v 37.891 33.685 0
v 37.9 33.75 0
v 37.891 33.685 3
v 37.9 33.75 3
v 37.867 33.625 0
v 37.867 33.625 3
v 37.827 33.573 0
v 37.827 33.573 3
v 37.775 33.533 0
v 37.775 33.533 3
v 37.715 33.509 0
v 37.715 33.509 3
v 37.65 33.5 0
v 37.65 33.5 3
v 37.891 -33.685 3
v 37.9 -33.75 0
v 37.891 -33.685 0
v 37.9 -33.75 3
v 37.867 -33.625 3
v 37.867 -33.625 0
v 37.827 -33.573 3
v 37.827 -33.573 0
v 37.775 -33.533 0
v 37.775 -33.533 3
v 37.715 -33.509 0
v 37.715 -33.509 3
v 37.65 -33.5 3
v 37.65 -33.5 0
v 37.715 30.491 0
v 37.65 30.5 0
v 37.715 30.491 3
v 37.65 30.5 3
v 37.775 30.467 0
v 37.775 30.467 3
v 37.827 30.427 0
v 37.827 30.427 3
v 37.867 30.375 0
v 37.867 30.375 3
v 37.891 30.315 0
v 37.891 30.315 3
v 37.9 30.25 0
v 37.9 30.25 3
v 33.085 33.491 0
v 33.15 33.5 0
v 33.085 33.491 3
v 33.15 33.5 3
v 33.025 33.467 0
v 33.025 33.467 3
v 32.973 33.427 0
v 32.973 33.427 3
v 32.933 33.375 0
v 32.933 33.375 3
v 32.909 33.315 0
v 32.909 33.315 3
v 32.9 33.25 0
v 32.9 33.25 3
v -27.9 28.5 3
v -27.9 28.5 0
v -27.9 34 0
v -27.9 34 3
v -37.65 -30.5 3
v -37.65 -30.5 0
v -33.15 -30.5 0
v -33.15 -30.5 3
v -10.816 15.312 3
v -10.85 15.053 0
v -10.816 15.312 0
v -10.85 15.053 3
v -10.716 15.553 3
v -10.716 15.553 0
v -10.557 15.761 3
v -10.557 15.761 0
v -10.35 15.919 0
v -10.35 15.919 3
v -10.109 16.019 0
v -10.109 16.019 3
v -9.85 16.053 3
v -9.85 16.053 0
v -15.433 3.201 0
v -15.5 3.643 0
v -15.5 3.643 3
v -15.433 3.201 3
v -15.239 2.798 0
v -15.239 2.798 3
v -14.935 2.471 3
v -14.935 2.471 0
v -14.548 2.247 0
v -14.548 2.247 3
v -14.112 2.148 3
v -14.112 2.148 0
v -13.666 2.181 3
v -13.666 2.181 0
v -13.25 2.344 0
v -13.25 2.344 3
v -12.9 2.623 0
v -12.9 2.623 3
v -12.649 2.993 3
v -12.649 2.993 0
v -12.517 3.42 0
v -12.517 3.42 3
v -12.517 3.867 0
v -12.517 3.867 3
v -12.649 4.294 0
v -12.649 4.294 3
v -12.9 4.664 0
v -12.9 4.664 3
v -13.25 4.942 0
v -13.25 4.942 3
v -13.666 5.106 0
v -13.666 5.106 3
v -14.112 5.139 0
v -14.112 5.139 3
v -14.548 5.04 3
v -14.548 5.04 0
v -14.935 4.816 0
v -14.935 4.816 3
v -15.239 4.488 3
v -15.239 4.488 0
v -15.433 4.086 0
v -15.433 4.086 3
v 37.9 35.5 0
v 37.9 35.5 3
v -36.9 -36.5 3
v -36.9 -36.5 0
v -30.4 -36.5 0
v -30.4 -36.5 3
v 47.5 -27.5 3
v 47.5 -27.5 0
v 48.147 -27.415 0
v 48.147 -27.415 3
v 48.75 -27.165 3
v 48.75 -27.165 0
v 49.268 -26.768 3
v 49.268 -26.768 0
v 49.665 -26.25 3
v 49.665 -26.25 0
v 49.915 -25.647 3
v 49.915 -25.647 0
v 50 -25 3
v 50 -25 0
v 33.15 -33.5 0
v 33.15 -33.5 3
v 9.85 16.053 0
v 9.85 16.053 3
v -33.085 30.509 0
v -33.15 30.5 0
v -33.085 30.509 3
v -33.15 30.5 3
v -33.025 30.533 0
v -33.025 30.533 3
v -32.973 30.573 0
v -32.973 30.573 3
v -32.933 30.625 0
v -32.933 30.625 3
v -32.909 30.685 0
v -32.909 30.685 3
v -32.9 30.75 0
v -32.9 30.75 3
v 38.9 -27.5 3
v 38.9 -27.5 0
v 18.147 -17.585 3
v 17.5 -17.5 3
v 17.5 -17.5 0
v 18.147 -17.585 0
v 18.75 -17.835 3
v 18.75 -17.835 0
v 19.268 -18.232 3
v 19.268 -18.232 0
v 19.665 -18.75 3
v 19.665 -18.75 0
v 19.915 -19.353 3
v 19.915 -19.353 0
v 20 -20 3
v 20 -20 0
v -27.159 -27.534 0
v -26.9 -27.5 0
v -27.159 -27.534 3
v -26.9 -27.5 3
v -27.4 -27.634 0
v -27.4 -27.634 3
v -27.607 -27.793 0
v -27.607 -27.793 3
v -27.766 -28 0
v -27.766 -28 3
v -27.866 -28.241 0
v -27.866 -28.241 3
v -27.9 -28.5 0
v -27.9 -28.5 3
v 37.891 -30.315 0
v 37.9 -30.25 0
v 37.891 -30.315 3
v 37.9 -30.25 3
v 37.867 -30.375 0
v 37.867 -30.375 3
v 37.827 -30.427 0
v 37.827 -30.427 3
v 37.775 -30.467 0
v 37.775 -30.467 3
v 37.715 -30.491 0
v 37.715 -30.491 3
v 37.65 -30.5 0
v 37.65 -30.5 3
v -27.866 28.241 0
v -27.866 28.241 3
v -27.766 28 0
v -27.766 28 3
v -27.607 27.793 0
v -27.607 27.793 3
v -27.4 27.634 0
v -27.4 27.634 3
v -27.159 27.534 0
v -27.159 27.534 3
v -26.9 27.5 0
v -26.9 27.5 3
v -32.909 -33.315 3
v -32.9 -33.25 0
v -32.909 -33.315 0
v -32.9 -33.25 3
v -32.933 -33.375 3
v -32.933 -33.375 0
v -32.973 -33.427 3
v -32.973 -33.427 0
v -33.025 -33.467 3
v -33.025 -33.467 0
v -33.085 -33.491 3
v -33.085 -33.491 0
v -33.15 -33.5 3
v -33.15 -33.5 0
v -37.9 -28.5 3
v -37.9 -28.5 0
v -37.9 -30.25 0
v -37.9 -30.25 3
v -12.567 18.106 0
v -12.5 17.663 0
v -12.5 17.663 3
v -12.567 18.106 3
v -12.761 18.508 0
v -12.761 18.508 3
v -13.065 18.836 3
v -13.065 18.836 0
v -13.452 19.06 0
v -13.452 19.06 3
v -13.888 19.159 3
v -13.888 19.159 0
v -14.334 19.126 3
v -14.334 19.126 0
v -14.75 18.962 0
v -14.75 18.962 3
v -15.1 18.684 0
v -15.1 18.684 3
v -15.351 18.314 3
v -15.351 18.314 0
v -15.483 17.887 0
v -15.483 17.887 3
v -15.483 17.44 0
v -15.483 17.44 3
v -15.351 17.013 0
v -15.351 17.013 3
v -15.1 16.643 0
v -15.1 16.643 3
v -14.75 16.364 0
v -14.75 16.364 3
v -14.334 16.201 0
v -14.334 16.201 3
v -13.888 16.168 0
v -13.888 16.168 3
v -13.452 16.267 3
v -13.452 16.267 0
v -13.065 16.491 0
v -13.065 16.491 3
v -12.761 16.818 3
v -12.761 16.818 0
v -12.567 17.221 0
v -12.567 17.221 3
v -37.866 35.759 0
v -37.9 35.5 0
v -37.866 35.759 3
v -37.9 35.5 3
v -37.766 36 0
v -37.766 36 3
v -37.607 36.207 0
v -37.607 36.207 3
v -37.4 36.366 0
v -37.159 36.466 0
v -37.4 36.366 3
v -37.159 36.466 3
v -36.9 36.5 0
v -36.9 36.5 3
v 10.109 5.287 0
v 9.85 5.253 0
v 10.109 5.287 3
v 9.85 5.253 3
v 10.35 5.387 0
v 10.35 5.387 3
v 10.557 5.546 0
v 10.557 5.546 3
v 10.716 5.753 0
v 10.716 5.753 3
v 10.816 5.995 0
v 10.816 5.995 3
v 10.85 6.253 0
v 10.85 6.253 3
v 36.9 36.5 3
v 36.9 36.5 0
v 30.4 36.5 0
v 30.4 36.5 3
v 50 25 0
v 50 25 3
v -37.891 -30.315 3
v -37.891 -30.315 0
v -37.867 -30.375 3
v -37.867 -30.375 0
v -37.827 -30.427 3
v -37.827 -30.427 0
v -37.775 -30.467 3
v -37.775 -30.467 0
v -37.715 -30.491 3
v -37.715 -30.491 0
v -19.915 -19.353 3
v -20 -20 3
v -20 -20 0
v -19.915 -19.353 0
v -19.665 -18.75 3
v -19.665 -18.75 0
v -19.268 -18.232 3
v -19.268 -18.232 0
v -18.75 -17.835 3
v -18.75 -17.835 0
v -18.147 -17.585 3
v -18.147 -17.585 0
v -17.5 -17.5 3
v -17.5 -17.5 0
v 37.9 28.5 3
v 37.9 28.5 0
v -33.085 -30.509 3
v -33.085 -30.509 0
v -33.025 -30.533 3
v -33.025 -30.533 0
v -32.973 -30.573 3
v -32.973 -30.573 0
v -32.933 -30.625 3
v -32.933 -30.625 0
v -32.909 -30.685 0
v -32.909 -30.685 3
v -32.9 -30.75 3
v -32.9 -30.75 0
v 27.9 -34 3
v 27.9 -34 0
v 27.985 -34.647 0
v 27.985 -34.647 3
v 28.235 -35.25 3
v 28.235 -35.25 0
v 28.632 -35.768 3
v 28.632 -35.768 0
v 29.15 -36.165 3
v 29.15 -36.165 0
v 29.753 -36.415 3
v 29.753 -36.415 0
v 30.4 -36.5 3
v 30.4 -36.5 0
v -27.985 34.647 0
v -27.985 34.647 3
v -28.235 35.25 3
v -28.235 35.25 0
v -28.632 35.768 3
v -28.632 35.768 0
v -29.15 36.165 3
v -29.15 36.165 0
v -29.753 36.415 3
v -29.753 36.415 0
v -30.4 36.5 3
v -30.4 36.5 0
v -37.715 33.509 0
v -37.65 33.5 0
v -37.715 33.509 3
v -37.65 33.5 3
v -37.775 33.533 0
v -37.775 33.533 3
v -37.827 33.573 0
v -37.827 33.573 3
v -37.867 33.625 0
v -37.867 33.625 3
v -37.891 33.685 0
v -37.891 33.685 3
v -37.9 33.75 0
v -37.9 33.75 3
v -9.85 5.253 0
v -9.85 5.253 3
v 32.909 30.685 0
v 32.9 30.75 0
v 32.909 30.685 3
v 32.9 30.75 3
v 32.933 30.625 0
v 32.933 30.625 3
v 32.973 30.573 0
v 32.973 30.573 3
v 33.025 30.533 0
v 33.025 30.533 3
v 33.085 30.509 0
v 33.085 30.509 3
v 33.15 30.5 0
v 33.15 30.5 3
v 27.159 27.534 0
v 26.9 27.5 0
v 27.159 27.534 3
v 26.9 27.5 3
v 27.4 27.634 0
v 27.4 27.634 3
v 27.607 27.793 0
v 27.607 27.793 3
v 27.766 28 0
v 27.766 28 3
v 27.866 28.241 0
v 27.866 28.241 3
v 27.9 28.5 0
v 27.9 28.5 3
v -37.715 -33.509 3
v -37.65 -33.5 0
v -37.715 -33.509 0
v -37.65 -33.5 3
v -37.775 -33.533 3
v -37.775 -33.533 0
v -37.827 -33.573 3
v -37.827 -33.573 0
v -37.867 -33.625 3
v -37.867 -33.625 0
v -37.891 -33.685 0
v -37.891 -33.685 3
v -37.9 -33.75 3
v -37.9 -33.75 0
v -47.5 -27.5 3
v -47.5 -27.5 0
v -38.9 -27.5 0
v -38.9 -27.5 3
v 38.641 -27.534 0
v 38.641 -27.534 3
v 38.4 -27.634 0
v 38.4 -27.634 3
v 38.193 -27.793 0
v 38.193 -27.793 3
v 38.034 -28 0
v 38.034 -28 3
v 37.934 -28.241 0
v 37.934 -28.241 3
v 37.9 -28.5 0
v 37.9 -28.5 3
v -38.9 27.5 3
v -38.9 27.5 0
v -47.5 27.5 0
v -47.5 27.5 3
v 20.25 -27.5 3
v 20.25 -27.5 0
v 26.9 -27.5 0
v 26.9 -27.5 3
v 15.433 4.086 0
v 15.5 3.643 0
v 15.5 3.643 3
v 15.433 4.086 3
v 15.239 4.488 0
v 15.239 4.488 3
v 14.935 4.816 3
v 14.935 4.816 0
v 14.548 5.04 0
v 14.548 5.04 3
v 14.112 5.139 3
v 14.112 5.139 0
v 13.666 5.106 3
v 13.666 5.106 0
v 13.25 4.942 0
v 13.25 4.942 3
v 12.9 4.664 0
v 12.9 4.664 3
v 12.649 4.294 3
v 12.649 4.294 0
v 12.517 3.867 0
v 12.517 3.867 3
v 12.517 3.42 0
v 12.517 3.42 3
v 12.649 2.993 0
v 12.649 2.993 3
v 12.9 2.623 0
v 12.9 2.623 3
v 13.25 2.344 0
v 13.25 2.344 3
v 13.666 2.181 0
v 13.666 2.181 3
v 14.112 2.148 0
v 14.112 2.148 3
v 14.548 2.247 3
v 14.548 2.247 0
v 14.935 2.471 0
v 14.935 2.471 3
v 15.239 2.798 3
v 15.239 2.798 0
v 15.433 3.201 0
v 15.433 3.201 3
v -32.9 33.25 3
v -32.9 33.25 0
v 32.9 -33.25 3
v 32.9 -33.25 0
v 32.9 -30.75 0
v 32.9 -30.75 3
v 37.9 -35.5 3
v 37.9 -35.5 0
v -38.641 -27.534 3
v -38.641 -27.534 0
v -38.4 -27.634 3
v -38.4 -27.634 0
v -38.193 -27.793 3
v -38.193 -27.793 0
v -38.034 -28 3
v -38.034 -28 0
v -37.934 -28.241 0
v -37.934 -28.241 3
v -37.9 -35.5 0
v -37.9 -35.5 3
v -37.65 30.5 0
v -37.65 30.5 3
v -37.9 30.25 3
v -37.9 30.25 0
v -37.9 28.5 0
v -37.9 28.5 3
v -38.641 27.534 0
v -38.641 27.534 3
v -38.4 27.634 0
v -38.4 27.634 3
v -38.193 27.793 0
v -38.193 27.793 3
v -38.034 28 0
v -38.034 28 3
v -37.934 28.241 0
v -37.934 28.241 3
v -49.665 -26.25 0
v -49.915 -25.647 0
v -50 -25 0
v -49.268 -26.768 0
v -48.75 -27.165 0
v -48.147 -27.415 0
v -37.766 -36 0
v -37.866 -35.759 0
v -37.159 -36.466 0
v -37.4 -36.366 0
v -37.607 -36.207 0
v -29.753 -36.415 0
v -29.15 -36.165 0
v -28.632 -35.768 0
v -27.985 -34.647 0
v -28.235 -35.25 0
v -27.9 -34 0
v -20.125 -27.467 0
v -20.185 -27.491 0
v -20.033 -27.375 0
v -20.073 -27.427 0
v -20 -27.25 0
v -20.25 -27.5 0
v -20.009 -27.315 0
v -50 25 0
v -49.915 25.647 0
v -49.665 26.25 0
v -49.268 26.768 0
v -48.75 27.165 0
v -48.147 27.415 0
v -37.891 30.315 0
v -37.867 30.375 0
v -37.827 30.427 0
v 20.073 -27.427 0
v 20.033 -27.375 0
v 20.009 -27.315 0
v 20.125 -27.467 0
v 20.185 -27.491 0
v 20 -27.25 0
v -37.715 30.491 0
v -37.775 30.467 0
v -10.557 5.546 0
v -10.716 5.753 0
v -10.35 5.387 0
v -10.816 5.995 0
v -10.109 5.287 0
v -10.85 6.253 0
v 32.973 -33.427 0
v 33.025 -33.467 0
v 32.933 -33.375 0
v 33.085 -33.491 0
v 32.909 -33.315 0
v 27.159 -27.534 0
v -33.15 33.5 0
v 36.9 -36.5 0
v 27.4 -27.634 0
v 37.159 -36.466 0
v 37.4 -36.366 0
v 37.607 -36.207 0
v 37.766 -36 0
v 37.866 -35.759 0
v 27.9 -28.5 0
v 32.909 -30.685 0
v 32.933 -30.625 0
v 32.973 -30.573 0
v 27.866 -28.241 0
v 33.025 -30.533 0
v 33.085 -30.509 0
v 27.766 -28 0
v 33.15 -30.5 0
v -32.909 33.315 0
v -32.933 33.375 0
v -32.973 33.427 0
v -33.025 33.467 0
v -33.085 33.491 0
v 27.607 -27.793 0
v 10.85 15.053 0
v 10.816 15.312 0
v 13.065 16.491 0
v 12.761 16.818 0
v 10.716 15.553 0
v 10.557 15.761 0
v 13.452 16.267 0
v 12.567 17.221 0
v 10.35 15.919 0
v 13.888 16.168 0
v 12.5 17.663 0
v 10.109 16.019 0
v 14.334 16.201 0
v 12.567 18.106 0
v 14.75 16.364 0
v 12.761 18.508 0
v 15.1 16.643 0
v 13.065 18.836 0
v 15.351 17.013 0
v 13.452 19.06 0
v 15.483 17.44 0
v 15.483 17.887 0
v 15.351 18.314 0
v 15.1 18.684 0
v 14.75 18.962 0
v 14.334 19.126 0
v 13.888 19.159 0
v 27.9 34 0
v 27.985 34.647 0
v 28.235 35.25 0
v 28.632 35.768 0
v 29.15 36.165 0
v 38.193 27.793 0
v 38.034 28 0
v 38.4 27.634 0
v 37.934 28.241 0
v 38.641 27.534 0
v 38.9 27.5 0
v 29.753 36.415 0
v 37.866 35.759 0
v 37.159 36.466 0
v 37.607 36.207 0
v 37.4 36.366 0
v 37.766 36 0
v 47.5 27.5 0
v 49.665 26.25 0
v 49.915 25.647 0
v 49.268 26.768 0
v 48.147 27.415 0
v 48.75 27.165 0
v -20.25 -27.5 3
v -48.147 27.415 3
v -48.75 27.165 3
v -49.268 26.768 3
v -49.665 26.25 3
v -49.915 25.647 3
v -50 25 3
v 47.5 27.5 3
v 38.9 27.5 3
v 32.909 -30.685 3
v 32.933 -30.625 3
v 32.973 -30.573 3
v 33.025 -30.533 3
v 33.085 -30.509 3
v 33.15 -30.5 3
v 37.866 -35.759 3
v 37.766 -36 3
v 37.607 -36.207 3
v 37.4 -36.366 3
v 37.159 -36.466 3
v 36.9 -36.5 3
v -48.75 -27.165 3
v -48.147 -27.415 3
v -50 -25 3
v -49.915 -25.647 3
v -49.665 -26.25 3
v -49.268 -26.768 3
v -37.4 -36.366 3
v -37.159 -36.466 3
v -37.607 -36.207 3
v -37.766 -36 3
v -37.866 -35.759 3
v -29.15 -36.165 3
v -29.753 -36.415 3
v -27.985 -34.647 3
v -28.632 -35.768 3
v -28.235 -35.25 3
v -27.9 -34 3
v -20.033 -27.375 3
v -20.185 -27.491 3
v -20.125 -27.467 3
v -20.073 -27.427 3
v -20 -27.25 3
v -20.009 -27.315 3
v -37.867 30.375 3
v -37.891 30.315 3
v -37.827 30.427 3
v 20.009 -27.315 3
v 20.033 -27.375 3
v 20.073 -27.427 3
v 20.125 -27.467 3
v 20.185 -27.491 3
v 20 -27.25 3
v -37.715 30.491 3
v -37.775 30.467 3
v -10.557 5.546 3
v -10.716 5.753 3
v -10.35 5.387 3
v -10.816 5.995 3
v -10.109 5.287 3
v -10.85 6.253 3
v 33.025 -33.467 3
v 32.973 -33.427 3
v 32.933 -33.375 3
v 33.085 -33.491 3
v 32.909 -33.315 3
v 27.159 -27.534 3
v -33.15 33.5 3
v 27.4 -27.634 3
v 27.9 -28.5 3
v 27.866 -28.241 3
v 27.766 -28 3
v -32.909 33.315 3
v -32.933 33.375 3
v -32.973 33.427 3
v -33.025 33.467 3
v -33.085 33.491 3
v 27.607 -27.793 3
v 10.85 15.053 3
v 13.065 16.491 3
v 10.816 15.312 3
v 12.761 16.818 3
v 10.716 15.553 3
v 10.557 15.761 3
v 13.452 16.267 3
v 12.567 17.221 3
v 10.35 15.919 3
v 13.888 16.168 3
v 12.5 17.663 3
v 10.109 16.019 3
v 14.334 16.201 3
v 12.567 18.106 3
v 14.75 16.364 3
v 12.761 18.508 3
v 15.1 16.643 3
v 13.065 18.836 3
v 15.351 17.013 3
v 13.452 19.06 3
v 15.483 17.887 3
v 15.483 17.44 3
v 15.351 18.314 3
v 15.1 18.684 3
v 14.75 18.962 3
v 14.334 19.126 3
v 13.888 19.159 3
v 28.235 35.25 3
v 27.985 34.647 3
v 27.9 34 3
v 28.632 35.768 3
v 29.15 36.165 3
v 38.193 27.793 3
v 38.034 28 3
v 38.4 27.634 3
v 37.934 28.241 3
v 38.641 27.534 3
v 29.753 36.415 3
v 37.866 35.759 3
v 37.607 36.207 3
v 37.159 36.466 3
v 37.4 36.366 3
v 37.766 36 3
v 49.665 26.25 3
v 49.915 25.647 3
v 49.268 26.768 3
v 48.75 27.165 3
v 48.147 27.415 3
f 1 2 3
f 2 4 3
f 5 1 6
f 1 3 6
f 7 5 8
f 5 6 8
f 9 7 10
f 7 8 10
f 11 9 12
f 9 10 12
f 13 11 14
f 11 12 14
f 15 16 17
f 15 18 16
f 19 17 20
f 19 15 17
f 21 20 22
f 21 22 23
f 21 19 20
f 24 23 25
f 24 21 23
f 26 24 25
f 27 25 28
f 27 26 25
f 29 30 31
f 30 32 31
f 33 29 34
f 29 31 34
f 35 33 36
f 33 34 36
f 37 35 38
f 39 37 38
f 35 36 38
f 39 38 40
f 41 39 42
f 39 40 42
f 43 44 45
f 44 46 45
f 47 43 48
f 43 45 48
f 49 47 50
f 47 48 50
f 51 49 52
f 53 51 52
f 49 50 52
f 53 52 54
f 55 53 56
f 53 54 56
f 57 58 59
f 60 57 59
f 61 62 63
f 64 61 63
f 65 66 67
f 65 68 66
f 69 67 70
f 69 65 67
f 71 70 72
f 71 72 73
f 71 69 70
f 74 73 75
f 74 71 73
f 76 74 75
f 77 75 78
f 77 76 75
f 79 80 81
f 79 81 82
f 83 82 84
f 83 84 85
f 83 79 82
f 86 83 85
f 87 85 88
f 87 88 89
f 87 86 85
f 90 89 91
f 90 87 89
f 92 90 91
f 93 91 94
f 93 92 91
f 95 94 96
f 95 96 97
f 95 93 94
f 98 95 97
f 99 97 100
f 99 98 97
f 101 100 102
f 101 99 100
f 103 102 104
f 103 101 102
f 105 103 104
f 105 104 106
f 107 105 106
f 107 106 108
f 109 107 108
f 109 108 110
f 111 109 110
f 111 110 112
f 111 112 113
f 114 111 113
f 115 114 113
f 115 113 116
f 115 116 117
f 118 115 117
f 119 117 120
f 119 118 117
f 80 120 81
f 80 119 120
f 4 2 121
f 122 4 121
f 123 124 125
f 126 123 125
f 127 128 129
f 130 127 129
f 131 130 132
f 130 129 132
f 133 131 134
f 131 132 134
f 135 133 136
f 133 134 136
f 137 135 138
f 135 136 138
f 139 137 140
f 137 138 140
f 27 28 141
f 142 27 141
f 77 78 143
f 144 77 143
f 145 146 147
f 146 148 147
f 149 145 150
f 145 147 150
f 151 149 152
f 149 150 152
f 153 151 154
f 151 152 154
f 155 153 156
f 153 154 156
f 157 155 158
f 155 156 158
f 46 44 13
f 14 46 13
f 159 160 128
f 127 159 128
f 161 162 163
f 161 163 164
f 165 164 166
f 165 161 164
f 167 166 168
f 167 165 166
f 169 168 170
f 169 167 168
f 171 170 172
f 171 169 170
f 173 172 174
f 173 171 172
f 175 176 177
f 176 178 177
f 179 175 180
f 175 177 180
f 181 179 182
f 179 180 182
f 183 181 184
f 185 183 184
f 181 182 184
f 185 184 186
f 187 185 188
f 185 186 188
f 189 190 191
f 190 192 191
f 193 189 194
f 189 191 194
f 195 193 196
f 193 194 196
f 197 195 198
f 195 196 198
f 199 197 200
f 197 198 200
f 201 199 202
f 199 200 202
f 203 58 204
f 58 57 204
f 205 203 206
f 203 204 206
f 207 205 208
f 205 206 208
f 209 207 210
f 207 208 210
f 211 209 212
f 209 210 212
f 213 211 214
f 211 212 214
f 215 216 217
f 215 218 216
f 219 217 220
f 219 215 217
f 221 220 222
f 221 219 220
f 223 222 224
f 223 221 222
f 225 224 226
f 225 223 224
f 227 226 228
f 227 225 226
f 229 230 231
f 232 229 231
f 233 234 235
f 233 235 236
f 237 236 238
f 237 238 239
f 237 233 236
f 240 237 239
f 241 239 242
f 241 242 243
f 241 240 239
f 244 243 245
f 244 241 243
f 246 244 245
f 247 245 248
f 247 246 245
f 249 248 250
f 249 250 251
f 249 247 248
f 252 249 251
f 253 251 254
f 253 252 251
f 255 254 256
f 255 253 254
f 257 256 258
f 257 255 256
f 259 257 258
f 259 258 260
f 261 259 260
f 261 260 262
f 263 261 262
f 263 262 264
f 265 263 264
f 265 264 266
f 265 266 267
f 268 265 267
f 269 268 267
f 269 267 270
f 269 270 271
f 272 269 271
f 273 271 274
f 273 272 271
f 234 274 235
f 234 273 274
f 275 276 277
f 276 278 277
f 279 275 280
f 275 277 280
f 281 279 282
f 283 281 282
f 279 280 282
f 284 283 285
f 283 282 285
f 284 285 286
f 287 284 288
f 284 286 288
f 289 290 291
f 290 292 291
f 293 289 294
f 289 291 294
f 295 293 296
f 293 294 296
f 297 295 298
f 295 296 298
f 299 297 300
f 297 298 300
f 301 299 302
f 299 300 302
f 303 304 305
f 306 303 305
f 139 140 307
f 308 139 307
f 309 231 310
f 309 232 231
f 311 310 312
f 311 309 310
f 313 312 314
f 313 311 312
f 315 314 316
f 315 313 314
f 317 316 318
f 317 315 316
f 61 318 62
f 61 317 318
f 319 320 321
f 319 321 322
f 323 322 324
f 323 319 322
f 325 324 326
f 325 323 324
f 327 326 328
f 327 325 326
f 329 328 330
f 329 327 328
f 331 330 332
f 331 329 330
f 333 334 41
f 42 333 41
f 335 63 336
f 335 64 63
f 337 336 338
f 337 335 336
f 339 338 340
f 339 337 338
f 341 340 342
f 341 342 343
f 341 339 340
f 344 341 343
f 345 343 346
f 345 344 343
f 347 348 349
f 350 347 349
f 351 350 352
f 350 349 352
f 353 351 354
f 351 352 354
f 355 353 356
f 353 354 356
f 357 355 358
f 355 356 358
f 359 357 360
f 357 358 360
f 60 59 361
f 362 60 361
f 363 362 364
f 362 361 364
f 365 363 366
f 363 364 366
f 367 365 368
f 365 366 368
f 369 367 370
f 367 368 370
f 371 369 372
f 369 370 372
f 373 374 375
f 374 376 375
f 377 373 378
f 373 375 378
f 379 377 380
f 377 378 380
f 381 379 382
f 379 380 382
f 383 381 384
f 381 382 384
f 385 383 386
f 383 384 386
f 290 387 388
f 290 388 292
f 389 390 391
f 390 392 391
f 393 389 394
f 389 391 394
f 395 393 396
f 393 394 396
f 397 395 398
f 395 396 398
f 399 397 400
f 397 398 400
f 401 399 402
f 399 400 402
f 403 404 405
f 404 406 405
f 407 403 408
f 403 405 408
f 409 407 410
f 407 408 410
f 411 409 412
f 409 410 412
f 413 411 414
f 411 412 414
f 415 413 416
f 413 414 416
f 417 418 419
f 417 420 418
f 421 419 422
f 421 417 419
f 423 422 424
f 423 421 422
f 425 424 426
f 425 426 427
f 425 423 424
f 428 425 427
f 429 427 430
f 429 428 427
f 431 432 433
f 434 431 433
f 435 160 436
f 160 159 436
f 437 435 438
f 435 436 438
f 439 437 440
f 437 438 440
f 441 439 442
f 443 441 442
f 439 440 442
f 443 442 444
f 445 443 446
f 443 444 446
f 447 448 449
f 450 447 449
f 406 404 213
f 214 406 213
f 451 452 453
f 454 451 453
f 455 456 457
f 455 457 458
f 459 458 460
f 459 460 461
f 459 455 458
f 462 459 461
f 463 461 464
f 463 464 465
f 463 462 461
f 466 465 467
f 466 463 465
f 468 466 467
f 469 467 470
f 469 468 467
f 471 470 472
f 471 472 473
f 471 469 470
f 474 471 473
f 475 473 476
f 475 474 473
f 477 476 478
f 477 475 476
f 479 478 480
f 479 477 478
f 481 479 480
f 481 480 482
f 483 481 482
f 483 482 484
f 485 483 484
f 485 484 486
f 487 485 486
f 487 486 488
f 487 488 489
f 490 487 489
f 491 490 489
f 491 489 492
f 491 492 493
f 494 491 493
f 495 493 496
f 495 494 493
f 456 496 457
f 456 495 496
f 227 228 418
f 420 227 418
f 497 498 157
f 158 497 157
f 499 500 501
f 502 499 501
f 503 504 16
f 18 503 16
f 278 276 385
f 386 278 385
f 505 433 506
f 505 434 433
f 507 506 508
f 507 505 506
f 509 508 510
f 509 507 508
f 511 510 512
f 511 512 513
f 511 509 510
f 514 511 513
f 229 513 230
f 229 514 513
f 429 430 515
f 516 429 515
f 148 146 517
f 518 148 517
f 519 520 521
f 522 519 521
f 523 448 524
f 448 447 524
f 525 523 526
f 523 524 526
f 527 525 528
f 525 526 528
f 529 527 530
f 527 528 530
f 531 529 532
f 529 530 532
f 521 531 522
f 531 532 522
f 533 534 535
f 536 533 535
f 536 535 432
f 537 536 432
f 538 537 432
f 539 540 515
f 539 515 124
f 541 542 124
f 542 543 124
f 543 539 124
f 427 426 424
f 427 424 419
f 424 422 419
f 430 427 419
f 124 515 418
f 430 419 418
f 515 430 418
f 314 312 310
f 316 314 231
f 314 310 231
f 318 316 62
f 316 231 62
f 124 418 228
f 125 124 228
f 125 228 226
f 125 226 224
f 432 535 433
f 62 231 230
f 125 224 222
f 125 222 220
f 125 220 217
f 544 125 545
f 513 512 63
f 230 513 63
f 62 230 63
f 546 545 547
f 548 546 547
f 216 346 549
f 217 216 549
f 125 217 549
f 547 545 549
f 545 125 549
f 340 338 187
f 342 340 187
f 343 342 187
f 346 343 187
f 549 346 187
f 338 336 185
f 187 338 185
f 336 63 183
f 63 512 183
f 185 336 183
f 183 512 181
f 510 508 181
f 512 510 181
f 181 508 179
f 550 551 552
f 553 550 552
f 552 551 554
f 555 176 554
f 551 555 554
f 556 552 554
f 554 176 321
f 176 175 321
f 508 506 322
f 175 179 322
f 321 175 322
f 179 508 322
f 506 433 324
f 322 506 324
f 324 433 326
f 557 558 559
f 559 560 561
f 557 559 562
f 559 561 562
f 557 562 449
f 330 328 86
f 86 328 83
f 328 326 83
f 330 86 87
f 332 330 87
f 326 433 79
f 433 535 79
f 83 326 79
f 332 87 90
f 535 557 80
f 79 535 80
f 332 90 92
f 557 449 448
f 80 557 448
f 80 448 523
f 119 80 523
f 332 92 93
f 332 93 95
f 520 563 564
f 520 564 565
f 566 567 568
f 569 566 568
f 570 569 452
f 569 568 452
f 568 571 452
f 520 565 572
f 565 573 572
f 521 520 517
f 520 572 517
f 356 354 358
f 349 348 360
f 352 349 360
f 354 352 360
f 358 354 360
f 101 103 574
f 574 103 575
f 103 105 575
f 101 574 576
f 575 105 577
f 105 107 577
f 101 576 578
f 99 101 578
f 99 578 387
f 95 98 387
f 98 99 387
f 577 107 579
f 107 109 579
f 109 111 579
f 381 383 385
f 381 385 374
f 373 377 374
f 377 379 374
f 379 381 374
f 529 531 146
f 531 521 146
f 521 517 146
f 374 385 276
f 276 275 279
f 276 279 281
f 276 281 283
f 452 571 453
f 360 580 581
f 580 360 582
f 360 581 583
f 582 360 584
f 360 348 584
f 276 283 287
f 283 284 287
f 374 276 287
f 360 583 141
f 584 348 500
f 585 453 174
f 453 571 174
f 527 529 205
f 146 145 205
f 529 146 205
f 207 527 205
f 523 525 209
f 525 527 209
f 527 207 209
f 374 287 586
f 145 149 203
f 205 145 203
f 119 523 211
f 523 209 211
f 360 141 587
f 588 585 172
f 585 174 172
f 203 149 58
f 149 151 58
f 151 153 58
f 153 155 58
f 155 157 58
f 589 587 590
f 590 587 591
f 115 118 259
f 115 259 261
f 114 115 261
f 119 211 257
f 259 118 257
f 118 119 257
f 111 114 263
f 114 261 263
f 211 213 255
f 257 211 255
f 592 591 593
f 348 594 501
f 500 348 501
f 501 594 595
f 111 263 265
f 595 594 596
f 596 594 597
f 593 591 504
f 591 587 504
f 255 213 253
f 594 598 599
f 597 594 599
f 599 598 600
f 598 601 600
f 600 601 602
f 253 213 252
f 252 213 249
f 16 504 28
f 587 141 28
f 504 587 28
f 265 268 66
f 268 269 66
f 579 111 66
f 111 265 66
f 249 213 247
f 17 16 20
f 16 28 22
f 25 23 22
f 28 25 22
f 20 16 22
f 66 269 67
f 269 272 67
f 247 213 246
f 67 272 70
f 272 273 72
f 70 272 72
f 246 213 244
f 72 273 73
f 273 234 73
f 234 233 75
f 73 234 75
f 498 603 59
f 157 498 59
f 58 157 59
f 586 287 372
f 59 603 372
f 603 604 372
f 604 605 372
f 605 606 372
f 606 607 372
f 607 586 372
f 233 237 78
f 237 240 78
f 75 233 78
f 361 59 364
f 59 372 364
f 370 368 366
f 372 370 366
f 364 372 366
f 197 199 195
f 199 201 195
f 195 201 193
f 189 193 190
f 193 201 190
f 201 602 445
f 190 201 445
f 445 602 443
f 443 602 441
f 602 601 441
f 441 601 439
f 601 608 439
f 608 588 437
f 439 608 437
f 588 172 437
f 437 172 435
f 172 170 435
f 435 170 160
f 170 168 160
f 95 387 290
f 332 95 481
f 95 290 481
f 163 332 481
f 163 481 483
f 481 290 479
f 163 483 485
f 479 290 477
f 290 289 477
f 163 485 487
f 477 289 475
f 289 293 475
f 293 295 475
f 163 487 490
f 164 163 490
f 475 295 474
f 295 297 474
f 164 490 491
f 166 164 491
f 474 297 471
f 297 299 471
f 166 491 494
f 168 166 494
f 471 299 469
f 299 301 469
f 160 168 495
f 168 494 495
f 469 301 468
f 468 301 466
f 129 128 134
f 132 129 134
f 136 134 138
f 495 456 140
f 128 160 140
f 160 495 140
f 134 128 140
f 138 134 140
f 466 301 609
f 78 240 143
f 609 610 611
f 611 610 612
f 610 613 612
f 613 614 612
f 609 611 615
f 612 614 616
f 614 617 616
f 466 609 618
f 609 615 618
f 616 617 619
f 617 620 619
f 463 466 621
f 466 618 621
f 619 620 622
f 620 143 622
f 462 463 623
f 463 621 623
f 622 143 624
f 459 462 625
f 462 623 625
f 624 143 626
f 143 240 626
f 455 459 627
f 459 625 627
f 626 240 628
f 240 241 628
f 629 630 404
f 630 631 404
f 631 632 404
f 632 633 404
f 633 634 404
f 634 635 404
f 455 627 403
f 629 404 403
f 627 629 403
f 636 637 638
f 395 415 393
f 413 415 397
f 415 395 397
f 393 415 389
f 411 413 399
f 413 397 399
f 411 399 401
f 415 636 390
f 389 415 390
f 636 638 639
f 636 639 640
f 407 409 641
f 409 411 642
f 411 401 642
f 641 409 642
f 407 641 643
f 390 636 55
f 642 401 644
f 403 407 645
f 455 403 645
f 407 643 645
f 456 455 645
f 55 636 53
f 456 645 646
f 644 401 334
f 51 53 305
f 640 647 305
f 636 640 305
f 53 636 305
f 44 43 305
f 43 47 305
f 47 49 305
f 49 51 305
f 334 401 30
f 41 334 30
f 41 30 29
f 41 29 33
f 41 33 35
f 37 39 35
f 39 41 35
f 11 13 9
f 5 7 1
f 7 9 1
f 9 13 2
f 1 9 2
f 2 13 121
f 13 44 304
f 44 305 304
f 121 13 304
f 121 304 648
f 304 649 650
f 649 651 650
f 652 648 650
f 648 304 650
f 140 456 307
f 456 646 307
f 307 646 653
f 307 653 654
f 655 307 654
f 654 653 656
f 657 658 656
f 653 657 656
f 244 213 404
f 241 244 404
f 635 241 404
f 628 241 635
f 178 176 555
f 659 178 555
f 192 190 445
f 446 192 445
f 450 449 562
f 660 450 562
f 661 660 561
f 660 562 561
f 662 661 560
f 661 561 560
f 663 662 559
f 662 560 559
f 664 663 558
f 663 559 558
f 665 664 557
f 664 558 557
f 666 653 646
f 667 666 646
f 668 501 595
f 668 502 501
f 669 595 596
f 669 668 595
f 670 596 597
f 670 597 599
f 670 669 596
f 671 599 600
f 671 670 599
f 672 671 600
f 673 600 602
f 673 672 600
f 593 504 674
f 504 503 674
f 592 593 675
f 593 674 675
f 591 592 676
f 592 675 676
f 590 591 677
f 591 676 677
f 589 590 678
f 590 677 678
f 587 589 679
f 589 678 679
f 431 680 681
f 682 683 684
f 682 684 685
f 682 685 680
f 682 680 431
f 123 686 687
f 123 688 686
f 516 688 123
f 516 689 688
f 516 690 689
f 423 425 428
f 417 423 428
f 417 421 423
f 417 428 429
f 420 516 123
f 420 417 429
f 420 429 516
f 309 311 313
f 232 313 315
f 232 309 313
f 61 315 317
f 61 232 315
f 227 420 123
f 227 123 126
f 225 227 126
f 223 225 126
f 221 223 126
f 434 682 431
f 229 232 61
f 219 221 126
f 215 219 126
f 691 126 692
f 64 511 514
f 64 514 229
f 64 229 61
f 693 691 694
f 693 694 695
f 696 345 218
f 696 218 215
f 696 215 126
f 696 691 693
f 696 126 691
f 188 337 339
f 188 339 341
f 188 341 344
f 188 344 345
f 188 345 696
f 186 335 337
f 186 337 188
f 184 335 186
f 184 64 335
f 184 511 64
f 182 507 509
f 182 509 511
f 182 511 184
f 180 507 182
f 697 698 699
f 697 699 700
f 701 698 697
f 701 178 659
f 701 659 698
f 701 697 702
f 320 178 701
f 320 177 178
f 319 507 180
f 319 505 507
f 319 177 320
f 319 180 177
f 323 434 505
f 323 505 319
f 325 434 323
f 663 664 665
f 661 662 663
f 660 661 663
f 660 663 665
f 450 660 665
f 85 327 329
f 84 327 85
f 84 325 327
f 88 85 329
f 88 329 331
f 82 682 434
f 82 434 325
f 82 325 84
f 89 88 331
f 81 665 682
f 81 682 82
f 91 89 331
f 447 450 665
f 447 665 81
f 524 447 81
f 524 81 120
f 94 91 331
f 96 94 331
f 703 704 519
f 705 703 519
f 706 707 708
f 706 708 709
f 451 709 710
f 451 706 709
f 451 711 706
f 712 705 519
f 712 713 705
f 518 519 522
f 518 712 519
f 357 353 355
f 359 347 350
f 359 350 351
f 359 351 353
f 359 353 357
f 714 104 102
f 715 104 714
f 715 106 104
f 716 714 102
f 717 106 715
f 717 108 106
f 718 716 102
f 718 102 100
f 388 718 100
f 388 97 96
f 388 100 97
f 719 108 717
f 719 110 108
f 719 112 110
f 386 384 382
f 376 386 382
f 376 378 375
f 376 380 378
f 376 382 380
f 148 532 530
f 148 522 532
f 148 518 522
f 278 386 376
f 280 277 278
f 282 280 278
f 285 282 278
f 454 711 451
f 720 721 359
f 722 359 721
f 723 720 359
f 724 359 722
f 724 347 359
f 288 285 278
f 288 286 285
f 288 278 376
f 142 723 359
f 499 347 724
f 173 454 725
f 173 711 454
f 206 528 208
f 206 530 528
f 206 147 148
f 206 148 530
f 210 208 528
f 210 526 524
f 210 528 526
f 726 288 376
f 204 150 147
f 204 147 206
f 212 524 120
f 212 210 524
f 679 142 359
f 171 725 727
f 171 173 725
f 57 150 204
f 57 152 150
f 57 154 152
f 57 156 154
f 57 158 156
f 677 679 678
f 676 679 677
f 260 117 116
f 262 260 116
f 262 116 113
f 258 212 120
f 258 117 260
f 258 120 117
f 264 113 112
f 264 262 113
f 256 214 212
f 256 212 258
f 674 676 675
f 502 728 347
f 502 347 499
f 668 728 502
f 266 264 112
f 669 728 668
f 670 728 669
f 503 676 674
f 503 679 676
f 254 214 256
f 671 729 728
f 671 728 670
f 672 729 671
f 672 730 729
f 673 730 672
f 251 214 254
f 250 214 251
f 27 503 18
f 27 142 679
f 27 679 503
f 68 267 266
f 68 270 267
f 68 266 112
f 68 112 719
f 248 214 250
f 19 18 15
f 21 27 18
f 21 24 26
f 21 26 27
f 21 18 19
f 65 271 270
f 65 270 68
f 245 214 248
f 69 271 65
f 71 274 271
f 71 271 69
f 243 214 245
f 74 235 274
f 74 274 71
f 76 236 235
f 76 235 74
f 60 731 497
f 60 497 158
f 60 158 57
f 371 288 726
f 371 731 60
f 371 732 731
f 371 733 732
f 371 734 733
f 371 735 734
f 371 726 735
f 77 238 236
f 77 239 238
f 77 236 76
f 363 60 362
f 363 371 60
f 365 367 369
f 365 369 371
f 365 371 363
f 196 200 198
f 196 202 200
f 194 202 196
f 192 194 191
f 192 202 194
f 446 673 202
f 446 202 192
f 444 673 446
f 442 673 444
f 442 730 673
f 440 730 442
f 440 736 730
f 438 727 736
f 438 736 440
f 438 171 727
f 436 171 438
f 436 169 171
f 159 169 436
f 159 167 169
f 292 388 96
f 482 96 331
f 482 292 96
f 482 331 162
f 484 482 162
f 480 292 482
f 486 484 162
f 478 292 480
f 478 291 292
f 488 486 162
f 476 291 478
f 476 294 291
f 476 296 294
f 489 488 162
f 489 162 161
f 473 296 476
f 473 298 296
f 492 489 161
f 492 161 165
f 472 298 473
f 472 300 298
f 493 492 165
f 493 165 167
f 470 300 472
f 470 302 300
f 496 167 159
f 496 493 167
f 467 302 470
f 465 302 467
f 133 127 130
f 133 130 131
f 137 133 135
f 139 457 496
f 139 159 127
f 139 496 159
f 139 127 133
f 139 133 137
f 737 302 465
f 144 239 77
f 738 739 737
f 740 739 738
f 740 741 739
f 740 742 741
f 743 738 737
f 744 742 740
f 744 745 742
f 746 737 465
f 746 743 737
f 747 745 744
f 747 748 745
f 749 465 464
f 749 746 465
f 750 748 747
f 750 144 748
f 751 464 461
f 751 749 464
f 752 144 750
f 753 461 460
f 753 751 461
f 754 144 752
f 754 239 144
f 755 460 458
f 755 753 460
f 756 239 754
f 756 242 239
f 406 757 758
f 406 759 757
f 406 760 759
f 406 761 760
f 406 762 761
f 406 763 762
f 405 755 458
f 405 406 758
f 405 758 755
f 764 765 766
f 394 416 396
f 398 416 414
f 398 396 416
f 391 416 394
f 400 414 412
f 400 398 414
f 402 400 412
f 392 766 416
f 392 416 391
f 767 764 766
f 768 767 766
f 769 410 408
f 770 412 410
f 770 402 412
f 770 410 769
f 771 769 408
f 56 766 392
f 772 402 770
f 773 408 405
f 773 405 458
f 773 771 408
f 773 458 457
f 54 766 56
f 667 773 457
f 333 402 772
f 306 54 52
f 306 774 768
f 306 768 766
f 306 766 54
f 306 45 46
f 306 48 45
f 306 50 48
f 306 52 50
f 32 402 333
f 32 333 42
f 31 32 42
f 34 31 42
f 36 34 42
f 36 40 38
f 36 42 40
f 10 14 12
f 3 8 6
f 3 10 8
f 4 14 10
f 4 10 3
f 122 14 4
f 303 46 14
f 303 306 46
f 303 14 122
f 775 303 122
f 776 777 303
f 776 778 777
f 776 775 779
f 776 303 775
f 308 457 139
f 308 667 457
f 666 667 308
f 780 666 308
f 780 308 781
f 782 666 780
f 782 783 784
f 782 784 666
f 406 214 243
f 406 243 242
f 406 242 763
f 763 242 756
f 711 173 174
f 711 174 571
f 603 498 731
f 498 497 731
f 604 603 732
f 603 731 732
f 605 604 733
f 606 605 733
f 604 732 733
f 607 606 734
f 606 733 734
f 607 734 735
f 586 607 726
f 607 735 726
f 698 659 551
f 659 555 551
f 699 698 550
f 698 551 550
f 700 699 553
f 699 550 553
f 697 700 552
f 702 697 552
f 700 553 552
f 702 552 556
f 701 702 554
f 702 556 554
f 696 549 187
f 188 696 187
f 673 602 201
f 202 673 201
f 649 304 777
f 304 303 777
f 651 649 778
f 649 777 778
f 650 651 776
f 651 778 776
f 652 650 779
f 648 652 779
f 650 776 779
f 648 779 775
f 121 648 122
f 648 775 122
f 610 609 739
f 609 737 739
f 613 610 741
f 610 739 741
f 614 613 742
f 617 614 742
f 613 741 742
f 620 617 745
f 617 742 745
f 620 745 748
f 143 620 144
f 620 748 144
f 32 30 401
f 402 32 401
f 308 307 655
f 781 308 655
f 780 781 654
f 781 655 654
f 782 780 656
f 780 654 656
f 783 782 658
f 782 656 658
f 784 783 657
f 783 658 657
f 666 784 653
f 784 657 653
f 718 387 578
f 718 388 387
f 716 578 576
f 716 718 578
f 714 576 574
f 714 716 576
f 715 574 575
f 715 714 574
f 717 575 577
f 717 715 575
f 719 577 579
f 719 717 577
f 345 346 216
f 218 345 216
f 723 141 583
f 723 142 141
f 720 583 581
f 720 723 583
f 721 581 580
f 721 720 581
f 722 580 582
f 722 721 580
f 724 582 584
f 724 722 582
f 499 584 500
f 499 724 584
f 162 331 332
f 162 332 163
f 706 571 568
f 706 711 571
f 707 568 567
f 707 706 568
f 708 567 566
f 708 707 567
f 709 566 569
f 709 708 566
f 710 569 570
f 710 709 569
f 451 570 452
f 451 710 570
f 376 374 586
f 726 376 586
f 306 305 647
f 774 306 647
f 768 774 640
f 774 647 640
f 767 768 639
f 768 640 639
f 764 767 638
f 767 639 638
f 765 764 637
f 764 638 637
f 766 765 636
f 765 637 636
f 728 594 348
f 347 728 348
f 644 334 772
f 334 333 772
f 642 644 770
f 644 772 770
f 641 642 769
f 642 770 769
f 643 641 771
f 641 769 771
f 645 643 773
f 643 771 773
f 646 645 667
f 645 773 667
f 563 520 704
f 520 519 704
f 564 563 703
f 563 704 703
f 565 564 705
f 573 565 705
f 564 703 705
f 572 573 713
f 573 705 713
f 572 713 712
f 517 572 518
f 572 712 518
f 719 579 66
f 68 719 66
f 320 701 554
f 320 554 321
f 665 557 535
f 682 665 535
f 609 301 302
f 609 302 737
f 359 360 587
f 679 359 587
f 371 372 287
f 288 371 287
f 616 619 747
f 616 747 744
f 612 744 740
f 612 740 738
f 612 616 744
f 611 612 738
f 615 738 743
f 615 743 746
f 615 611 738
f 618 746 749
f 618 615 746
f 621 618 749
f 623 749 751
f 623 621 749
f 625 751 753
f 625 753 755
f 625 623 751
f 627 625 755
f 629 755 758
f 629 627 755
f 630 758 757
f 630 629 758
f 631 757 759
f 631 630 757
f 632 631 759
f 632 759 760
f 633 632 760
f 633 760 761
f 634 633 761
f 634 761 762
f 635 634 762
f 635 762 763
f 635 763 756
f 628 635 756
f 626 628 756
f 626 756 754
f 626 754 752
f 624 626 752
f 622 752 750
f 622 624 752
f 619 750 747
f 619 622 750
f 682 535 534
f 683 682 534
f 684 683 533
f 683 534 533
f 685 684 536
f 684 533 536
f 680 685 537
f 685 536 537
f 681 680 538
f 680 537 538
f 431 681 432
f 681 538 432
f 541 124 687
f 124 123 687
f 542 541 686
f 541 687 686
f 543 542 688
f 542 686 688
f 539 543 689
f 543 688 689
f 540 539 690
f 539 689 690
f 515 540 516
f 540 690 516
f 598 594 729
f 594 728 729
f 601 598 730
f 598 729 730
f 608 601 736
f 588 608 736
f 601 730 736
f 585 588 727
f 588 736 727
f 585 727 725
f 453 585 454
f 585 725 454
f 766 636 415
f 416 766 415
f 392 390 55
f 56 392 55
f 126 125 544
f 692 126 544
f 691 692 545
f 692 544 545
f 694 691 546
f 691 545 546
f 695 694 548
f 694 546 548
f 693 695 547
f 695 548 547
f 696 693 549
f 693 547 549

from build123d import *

# Parameters (mm, degrees)
CROQUIS1_R              = 1.5
CROQUIS1_W              = 21.7
CROQUIS1_H              = 10.8
SALIENTE_EXTRUIR1_DEPTH = 3
CORTAR_EXTRUIR2_DEPTH   = 3
REDONDEO1_R             = 1
REDONDEO2_R             = 0.25


with BuildPart() as part:
    # Croquis1 → Saliente-Extruir1 (new body)
    with BuildSketch(Plane.XY):
        with BuildLine():
            Line((-50, 25), (-50, -25))
            ThreePointArc((-50, -25), (-49.267766953, -26.767766953), (-47.5, -27.5))
            Line((-47.5, -27.5), (-37.9, -27.5))
            Line((-37.9, -27.5), (-37.9, -30.5))
            Line((-37.9, -30.5), (-32.9, -30.5))
            Line((-32.9, -30.5), (-32.9, -33.5))
            Line((-32.9, -33.5), (-37.9, -33.5))
            Line((-37.9, -33.5), (-37.9, -36.5))
            Line((-37.9, -36.5), (-30.4, -36.5))
            ThreePointArc((-30.4, -36.5), (-28.632233047, -35.767766953), (-27.9, -34))
            Line((-27.9, -34), (-27.9, -27.5))
            Line((-27.9, -27.5), (27.9, -27.5))
            Line((27.9, -27.5), (27.9, -34))
            ThreePointArc((27.9, -34), (28.632233047, -35.767766953), (30.4, -36.5))
            Line((30.4, -36.5), (37.9, -36.5))
            Line((37.9, -36.5), (37.9, -33.5))
            Line((37.9, -33.5), (32.9, -33.5))
            Line((32.9, -33.5), (32.9, -30.5))
            Line((32.9, -30.5), (37.9, -30.5))
            Line((37.9, -30.5), (37.9, -27.5))
            Line((37.9, -27.5), (47.5, -27.5))
            ThreePointArc((47.5, -27.5), (49.267766953, -26.767766953), (50, -25))
            Line((50, -25), (50, 25))
            ThreePointArc((50, 25), (49.267766953, 26.767766953), (47.5, 27.5))
            Line((47.5, 27.5), (37.9, 27.5))
            Line((37.9, 27.5), (37.9, 30.5))
            Line((37.9, 30.5), (32.9, 30.5))
            Line((32.9, 30.5), (32.9, 33.5))
            Line((32.9, 33.5), (37.9, 33.5))
            Line((37.9, 33.5), (37.9, 36.5))
            Line((37.9, 36.5), (30.4, 36.5))
            ThreePointArc((30.4, 36.5), (28.632233047, 35.767766953), (27.9, 34))
            Line((27.9, 34), (27.9, 27.5))
            Line((27.9, 27.5), (-27.9, 27.5))
            Line((-27.9, 27.5), (-27.9, 34))
            ThreePointArc((-27.9, 34), (-28.632233047, 35.767766953), (-30.4, 36.5))
            Line((-30.4, 36.5), (-37.9, 36.5))
            Line((-37.9, 36.5), (-37.9, 33.5))
            Line((-37.9, 33.5), (-32.9, 33.5))
            Line((-32.9, 33.5), (-32.9, 30.5))
            Line((-32.9, 30.5), (-37.9, 30.5))
            Line((-37.9, 30.5), (-37.9, 27.5))
            Line((-37.9, 27.5), (-47.5, 27.5))
            ThreePointArc((-47.5, 27.5), (-49.267766953, 26.767766953), (-50, 25))
        make_face()
        with Locations((-14, 17.663397979)):
            Circle(CROQUIS1_R, mode=Mode.SUBTRACT)
        with Locations(Location((14, 17.663397979, 0), (0, 0, 180))):
            Circle(CROQUIS1_R, mode=Mode.SUBTRACT)
        with Locations((14, 3.643397979)):
            Circle(CROQUIS1_R, mode=Mode.SUBTRACT)
        with Locations(Location((-14, 3.643397979, 0), (0, 0, 180))):
            Circle(CROQUIS1_R, mode=Mode.SUBTRACT)
        with Locations((0, 10.653397979)):
            Rectangle(CROQUIS1_W, CROQUIS1_H, mode=Mode.SUBTRACT)
    extrude(amount=SALIENTE_EXTRUIR1_DEPTH)

    # Croquis2 → Cortar-Extruir2 (cut, symmetric)
    with BuildSketch(Plane.XY):
        with BuildLine():
            Line((-17.5, -17.5), (17.5, -17.5))
            ThreePointArc((17.5, -17.5), (19.267766953, -18.232233047), (20, -20))
            Line((20, -20), (20, -37.5))
            Line((20, -37.5), (-20, -37.5))
            Line((-20, -37.5), (-20, -20))
            ThreePointArc((-20, -20), (-19.267766953, -18.232233047), (-17.5, -17.5))
        make_face()
    extrude(amount=CORTAR_EXTRUIR2_DEPTH, both=True, mode=Mode.SUBTRACT)

    # Redondeo1
    redondeo1_edges = [part.edges().sort_by_distance(p)[0] for p in [
        (10.85, 5.253397979, 1.5),
        (10.85, 16.053397979, 1.5),
        (-10.85, 16.053397979, 1.5),
        (-10.85, 5.253397979, 1.5),
        (-37.9, -27.5, 1.5),
        (-37.9, 27.5, 1.5),
        (-37.9, 36.5, 1.5),
        (-27.9, 27.5, 1.5),
        (27.9, 27.5, 1.5),
        (37.9, 36.5, 1.5),
        (37.9, 27.5, 1.5),
        (37.9, -27.5, 1.5),
        (37.9, -36.5, 1.5),
        (27.9, -27.5, 1.5),
        (-27.9, -27.5, 1.5),
        (-37.9, -36.5, 1.5),
    ]]
    fillet(redondeo1_edges, radius=REDONDEO1_R)

    # Redondeo2
    redondeo2_edges = [part.edges().sort_by_distance(p)[0] for p in [
        (20, -27.5, 1.5),
        (-20, -27.5, 1.5),
        (-37.9, 30.5, 1.5),
        (-32.9, 30.5, 1.5),
        (-32.9, 33.5, 1.5),
        (-37.9, 33.5, 1.5),
        (37.9, 33.5, 1.5),
        (32.9, 33.5, 1.5),
        (32.9, 30.5, 1.5),
        (37.9, 30.5, 1.5),
        (37.9, -30.5, 1.5),
        (32.9, -30.5, 1.5),
        (32.9, -33.5, 1.5),
        (37.9, -33.5, 1.5),
        (-37.9, -33.5, 1.5),
        (-32.9, -33.5, 1.5),
        (-32.9, -30.5, 1.5),
        (-37.9, -30.5, 1.5),
    ]]
    fillet(redondeo2_edges, radius=REDONDEO2_R)


solid = part.part
